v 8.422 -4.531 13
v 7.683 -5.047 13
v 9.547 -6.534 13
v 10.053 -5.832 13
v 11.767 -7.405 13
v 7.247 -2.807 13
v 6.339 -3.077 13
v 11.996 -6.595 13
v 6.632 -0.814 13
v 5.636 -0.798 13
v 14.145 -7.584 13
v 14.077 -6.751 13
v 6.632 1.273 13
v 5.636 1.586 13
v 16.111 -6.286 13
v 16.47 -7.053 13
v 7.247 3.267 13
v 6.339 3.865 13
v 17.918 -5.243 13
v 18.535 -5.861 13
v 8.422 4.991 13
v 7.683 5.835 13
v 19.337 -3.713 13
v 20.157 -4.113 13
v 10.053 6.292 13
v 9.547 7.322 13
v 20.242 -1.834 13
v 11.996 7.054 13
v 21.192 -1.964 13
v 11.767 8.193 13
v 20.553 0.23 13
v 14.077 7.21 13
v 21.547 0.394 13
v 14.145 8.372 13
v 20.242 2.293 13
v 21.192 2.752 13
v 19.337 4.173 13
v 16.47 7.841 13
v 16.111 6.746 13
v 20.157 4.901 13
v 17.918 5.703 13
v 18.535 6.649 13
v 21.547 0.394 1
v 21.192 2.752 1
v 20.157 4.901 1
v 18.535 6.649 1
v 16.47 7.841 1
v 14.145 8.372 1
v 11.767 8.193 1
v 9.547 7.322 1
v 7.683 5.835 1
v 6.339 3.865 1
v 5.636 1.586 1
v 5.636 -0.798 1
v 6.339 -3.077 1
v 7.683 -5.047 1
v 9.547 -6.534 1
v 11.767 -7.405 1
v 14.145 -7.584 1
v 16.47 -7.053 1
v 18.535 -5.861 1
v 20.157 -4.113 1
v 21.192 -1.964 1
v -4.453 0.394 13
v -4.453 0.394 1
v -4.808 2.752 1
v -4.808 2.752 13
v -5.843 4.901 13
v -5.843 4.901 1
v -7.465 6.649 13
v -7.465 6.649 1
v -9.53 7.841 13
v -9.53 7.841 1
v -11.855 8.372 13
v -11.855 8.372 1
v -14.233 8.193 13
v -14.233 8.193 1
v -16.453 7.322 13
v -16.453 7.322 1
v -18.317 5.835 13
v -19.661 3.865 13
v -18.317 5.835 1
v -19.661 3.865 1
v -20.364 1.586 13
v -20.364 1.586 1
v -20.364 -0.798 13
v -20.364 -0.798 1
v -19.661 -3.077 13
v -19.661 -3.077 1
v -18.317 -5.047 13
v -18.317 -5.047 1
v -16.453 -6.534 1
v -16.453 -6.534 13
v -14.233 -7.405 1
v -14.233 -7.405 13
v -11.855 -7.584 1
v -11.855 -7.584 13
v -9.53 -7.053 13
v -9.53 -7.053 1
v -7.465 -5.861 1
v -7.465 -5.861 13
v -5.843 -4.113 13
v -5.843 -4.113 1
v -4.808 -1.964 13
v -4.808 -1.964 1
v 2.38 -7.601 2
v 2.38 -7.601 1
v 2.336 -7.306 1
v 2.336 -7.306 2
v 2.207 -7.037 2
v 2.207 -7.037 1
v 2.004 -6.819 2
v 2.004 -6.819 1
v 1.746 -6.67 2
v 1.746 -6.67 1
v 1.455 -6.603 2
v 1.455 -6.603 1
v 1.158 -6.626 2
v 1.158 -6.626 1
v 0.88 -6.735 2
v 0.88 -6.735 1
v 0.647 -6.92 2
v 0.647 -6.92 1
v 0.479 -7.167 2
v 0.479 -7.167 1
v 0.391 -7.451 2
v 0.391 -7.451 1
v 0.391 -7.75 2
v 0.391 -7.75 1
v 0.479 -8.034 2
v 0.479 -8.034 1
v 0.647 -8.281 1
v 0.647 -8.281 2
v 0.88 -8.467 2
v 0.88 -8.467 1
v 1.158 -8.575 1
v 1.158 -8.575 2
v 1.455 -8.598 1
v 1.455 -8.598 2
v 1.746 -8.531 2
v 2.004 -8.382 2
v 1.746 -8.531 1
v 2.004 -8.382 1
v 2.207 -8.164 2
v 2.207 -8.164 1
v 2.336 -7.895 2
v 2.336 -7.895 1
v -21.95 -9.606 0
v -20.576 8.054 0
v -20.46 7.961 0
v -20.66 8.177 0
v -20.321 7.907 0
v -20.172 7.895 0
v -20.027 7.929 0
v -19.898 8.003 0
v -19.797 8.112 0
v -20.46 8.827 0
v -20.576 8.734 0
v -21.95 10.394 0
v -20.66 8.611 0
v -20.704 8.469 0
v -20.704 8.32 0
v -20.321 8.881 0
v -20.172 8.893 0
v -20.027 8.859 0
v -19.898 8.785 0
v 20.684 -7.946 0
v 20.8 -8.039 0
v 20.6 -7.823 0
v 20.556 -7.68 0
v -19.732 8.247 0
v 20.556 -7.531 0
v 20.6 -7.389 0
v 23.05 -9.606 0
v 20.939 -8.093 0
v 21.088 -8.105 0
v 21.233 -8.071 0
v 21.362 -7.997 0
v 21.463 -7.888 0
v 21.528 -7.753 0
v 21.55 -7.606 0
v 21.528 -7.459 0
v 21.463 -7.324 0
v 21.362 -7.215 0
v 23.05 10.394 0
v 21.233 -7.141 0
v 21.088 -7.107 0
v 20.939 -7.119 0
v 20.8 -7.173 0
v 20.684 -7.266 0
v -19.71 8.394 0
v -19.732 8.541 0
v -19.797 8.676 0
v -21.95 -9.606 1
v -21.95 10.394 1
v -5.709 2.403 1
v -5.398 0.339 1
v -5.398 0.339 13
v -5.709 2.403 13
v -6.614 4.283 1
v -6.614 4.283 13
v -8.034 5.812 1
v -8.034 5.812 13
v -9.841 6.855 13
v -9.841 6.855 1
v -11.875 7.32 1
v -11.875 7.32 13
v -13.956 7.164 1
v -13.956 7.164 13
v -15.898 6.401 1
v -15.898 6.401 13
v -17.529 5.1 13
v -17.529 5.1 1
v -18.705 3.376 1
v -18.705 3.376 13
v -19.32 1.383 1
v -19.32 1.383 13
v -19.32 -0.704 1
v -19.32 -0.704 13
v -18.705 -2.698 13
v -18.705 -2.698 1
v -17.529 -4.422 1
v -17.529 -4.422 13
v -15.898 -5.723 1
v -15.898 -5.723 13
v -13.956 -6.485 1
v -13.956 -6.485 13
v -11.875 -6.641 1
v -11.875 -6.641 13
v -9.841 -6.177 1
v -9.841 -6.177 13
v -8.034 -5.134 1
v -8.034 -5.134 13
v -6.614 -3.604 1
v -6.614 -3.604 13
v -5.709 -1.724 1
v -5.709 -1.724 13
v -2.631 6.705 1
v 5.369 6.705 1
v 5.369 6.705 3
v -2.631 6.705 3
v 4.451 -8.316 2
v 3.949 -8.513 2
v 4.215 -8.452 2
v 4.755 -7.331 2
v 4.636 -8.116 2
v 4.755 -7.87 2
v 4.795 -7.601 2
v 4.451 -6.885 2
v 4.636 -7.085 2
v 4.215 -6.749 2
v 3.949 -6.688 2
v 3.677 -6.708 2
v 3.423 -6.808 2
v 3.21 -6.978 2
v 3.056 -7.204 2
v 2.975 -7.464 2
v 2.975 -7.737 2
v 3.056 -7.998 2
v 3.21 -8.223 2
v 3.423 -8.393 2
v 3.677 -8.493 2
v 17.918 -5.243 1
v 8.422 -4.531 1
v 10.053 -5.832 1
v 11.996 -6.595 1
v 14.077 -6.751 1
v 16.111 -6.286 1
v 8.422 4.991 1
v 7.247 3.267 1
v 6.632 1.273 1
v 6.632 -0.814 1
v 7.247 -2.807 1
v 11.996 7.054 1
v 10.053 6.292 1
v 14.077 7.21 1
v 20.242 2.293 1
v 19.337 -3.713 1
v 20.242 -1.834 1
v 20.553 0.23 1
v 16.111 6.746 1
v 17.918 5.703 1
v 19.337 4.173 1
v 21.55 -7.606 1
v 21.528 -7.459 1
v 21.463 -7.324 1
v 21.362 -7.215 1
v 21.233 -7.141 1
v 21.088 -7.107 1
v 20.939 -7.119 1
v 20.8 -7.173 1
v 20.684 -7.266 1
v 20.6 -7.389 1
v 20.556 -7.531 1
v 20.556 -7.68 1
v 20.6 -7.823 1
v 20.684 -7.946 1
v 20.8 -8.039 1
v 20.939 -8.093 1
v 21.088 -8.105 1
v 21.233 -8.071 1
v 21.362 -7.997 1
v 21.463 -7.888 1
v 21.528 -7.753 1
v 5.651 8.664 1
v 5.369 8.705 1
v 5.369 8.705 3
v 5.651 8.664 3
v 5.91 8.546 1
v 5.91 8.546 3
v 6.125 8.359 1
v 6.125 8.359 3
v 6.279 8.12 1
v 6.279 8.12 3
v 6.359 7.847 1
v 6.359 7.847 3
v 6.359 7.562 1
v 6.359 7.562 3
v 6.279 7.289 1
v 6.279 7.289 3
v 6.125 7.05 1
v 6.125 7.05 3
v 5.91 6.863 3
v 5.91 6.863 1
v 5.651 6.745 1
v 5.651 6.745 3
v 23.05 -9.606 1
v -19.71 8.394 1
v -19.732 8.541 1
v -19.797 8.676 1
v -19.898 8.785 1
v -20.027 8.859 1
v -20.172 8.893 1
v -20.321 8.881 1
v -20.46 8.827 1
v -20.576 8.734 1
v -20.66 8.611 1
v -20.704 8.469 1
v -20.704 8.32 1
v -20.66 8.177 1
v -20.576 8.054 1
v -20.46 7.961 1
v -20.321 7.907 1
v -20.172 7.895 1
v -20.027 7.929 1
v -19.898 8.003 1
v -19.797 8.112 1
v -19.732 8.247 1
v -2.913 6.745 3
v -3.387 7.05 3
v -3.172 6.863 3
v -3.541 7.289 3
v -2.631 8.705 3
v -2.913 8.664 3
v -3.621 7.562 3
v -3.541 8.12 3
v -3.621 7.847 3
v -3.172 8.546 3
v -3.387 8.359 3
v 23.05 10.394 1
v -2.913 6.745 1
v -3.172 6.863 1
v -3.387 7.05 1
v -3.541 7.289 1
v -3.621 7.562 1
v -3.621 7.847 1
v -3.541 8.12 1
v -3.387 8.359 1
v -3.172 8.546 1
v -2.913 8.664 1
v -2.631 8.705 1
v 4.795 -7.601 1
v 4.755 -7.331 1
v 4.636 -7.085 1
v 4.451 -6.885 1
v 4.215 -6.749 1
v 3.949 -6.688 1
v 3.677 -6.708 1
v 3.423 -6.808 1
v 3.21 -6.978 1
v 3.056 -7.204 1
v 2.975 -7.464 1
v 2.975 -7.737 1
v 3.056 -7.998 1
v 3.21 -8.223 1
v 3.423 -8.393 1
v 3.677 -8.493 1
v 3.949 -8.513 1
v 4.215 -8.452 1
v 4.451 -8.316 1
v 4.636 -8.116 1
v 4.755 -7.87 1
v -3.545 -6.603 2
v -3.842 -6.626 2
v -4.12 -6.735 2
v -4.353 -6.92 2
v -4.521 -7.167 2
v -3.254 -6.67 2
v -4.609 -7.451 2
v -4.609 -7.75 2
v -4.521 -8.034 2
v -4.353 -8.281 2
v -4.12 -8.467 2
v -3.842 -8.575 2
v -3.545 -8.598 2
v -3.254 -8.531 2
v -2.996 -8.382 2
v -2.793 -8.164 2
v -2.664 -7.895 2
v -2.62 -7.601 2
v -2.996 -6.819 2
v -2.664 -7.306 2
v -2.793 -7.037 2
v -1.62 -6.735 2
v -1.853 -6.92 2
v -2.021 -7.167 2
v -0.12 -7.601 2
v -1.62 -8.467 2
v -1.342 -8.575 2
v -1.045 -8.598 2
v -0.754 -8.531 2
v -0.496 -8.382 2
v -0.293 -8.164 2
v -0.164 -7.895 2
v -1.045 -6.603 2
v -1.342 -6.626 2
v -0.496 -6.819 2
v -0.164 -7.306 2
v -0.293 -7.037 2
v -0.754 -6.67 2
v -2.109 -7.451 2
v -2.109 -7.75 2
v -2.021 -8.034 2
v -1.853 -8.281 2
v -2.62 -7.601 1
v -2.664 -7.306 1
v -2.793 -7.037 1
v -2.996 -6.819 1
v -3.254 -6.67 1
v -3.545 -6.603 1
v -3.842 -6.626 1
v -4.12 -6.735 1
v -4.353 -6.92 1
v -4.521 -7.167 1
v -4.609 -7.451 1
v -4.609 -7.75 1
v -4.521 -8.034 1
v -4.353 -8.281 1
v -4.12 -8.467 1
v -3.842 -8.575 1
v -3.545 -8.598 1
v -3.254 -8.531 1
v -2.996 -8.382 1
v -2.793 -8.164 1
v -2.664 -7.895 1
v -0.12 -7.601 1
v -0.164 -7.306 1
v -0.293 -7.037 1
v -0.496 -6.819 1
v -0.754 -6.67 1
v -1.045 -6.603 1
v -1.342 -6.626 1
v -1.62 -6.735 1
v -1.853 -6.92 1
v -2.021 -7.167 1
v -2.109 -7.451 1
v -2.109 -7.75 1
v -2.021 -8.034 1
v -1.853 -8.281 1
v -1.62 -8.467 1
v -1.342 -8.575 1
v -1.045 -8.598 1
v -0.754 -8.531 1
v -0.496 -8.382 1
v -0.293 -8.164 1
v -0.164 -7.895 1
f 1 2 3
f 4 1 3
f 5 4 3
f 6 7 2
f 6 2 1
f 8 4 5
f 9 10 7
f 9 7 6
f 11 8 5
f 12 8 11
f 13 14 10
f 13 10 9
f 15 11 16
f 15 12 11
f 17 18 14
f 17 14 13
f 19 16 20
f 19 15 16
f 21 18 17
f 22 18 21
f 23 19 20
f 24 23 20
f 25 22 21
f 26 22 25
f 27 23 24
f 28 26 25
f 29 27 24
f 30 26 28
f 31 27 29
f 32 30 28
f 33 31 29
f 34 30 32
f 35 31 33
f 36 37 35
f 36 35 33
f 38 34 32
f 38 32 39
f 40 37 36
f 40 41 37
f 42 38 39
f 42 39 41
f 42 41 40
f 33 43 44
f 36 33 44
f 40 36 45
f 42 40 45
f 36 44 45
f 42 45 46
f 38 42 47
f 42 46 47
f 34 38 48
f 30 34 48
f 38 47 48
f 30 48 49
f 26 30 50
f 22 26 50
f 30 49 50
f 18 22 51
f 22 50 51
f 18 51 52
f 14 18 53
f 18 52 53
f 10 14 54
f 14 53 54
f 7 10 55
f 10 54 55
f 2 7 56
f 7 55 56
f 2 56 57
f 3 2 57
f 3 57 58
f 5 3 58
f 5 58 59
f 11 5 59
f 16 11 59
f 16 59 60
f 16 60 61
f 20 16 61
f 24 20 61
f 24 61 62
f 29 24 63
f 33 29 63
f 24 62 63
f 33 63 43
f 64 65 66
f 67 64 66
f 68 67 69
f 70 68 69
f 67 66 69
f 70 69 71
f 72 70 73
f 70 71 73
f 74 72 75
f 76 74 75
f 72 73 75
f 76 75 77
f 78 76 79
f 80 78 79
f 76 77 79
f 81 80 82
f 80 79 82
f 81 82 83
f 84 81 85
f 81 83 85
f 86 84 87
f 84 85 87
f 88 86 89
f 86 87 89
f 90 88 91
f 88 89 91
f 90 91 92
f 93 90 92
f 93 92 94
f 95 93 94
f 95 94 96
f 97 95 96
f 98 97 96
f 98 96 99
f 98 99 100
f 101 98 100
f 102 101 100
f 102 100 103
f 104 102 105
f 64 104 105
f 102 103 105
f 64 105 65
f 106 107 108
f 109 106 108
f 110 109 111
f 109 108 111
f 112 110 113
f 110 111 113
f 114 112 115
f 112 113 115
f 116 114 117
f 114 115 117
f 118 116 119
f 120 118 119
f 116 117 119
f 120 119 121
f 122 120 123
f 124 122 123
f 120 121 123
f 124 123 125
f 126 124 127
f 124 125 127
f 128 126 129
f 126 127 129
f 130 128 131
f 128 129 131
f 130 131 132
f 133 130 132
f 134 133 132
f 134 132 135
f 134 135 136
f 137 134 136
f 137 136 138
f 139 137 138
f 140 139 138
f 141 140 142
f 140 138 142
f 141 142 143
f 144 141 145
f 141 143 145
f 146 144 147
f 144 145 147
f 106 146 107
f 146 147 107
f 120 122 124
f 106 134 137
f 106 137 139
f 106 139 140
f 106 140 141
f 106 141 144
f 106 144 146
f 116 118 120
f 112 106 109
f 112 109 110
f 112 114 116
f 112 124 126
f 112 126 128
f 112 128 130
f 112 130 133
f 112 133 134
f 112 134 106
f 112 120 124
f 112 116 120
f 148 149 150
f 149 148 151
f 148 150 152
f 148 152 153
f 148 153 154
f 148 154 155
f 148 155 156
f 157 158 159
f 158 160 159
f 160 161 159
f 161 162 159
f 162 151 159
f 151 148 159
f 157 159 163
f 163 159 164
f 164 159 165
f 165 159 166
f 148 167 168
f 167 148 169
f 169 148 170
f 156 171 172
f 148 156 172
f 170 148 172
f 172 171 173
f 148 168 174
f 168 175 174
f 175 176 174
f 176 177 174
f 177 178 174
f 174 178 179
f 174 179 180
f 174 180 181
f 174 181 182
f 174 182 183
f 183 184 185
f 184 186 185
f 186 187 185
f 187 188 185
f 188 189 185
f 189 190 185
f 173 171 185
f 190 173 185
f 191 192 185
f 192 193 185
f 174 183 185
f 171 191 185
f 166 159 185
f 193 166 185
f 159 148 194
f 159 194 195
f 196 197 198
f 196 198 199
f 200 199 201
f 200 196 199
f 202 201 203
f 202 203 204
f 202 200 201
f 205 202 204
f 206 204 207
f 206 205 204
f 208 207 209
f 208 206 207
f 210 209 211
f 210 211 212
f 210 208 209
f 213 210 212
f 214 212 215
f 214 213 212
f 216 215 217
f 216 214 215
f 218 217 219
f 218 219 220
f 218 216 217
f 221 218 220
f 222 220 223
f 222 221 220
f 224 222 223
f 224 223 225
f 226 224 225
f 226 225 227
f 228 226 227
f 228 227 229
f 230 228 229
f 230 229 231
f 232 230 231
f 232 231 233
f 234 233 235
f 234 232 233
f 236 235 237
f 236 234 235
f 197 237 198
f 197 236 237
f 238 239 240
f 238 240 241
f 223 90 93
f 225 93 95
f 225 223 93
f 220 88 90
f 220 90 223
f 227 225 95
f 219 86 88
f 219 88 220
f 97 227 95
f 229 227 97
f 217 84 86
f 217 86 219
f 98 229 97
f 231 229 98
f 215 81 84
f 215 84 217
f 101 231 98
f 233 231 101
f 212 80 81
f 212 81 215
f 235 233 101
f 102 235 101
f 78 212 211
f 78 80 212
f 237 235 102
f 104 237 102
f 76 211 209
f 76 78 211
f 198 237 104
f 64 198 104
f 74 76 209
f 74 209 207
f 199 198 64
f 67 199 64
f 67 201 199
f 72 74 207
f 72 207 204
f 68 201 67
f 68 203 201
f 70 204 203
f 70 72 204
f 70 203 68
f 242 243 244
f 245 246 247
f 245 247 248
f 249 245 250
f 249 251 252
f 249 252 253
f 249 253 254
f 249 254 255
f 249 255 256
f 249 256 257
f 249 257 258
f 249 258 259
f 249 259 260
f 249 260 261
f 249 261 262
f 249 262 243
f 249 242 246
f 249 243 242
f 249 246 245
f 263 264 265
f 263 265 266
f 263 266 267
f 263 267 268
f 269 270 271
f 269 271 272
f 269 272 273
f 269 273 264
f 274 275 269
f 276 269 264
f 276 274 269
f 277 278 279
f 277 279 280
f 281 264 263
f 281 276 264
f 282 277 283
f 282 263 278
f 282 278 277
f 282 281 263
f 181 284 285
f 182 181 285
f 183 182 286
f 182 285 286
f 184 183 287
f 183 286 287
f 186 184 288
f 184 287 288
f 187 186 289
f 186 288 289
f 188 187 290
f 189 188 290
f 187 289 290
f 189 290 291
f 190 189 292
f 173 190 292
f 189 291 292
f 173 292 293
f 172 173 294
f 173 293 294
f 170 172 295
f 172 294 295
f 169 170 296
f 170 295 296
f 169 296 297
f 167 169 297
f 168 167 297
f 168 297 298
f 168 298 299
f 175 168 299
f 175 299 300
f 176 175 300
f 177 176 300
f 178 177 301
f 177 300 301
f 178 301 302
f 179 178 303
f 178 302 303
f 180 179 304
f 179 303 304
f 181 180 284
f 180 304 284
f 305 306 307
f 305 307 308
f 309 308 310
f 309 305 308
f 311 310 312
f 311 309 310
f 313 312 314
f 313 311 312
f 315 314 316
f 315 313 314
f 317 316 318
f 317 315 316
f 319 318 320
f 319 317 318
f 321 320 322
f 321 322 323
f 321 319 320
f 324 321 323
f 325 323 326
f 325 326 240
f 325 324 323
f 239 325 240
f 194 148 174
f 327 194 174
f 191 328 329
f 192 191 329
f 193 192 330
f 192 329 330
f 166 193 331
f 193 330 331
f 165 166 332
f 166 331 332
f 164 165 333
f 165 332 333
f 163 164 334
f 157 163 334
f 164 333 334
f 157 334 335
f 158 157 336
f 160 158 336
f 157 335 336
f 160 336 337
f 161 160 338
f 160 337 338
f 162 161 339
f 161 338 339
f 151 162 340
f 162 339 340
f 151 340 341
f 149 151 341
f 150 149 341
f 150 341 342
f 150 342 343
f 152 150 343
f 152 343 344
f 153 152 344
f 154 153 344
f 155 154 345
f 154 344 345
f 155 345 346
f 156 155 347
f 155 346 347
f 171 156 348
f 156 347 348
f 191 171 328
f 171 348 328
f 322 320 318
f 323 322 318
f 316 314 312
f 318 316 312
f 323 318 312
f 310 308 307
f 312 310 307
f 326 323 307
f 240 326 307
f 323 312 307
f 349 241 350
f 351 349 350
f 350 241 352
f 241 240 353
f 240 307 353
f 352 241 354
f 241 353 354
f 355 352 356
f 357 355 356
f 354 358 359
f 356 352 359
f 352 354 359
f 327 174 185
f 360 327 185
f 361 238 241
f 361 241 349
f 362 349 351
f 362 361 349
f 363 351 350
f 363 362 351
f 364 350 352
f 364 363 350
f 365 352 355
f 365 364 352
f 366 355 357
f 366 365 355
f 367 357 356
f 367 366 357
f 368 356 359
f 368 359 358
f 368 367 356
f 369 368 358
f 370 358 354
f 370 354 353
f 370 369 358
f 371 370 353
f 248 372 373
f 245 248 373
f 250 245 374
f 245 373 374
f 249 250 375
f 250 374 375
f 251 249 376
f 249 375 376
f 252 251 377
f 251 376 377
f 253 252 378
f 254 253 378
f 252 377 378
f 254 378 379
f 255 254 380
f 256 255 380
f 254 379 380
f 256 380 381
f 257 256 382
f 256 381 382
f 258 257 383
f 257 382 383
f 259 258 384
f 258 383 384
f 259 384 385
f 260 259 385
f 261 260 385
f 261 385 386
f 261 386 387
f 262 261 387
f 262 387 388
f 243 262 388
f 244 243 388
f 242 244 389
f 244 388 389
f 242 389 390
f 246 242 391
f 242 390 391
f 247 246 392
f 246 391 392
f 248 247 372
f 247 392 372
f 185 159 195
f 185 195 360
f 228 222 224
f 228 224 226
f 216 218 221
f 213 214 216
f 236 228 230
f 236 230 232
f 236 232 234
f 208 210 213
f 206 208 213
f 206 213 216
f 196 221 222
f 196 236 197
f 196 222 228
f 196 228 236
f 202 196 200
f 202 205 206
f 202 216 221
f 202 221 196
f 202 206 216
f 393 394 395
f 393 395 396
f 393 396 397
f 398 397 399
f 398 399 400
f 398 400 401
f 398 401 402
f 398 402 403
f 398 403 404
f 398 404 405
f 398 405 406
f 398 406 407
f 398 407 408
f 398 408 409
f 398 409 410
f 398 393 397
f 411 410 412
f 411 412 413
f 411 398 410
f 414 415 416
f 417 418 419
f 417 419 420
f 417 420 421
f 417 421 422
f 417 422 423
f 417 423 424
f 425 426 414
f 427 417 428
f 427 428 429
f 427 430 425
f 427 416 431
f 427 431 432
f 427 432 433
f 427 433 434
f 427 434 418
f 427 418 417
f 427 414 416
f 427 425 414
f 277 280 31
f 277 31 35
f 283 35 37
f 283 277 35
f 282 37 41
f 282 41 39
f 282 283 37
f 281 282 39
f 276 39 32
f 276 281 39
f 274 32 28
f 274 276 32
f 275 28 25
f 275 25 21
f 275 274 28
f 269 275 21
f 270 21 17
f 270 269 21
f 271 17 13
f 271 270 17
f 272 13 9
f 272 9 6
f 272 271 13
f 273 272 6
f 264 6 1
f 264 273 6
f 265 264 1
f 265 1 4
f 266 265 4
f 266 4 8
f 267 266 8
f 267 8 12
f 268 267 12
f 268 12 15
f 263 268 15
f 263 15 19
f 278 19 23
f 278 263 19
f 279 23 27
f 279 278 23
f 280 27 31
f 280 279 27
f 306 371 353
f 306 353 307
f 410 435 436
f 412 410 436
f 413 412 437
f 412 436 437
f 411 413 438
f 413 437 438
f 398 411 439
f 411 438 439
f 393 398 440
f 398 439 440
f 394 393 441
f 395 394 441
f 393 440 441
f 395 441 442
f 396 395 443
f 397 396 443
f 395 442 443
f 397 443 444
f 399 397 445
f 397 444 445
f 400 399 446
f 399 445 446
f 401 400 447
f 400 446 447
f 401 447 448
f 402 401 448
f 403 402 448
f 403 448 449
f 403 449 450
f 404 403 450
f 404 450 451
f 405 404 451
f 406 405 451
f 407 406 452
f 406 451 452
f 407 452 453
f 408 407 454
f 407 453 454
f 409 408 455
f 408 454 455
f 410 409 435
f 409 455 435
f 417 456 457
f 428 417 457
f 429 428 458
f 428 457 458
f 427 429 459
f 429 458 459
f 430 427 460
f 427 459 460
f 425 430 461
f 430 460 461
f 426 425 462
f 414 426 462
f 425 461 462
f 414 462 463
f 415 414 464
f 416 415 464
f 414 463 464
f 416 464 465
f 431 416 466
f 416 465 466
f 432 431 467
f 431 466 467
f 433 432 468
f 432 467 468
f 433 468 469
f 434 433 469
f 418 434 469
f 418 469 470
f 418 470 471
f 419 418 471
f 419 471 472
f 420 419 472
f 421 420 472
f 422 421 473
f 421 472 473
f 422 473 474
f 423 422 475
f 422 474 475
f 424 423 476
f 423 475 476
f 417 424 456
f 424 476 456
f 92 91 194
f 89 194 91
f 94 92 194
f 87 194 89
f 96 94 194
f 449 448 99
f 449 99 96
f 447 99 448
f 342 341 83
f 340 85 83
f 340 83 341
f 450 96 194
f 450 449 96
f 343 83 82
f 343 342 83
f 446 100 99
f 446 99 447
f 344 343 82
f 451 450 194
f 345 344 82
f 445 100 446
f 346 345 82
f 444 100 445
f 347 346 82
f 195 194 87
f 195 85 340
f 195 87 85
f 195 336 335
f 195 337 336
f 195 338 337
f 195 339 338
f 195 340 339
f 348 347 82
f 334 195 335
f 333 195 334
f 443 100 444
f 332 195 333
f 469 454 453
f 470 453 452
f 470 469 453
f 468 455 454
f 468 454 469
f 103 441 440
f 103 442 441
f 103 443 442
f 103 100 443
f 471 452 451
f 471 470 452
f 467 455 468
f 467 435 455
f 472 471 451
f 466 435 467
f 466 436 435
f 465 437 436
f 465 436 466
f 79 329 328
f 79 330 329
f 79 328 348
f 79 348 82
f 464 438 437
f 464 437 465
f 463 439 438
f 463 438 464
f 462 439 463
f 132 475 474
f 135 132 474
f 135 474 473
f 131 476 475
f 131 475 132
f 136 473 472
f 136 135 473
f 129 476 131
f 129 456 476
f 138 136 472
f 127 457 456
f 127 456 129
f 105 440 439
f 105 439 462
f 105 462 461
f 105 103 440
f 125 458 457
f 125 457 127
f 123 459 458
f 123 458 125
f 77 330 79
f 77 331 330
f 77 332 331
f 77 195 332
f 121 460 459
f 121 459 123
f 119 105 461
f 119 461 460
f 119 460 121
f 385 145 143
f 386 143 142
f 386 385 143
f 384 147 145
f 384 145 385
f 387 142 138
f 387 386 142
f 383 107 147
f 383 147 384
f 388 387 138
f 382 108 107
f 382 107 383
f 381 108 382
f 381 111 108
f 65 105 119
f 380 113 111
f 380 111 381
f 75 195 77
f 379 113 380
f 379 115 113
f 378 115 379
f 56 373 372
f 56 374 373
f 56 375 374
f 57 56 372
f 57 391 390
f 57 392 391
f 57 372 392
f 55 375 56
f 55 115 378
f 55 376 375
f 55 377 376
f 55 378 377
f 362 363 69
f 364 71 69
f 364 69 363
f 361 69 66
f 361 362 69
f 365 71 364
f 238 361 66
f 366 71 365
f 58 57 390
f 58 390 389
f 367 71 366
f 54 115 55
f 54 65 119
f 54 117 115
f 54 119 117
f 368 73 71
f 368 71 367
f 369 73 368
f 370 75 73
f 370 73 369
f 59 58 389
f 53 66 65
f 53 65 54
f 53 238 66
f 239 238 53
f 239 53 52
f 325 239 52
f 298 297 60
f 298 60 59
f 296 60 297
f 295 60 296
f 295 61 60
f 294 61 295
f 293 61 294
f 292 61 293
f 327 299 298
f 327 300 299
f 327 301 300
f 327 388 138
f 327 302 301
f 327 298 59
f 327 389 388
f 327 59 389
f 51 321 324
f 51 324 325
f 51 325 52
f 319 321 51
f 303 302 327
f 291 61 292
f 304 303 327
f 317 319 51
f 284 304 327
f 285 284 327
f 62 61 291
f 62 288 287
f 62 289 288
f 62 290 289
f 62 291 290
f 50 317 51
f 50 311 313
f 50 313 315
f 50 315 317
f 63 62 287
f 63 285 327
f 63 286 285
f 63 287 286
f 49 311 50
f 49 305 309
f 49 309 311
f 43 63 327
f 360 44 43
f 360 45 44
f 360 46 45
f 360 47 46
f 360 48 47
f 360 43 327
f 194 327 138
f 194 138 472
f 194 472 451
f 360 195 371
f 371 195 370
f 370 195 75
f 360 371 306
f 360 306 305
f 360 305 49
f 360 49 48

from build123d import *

# Parameters (mm, degrees)
SKETCH1_W           = 45
SKETCH1_H           = 20
BOSS_EXTRUDE1_DEPTH = 1
SKETCH2_R           = 8
SKETCH2_R_2         = 7
BOSS_EXTRUDE2_DEPTH = 12
BOSS_EXTRUDE3_DEPTH = 2
SKETCH5_R           = 1
SKETCH5_R_2         = 0.915040835
BOSS_EXTRUDE4_DEPTH = 1
SKETCH6_R           = 0.5
CUT_EXTRUDE1_DEPTH  = 1


with BuildPart() as part:
    # Sketch1 → Boss-Extrude1 (new body)
    with BuildSketch(Plane.XY):
        with Locations((0.550271739, 0.394021739)):
            Rectangle(SKETCH1_W, SKETCH1_H)
    extrude(amount=BOSS_EXTRUDE1_DEPTH)

    # Sketch2 → Boss-Extrude2 (add)
    # profile 1 of 2: a face of its own
    with BuildSketch(Plane.XY.offset(1)):
        with Locations((-12.452884101, 0.394021739)):
            Circle(SKETCH2_R)
        with Locations((-12.398133971, 0.339271609)):
            Circle(SKETCH2_R_2, mode=Mode.SUBTRACT)
    # profile 2 of 2: a face of its own
    with BuildSketch(Plane.XY.offset(1)):
        with Locations((13.547115899, 0.394021739)):
            Circle(SKETCH2_R)
        with Locations((13.55342758, 0.22977135)):
            Circle(SKETCH2_R_2, mode=Mode.SUBTRACT)
    extrude(amount=BOSS_EXTRUDE2_DEPTH)

    # Sketch4 → Boss-Extrude3 (add)
    with BuildSketch(Plane.XY.offset(1)):
        with BuildLine():
            Line((-2.6309647, 8.704551111), (5.3690353, 8.704551111))
            ThreePointArc((5.3690353, 8.704551111), (6.3690353, 7.704551111), (5.3690353, 6.704551111))
            Line((5.3690353, 6.704551111), (-2.6309647, 6.704551111))
            ThreePointArc((-2.6309647, 6.704551111), (-3.6309647, 7.704551111), (-2.6309647, 8.704551111))
        make_face()
    extrude(amount=BOSS_EXTRUDE3_DEPTH)

    # Sketch5 → Boss-Extrude4 (add)
    with BuildSketch(Plane.XY.offset(1)):
        with Locations((-3.619683348, -7.600525734)):
            Circle(SKETCH5_R)
        with Locations((-1.119683348, -7.600525734)):
            Circle(SKETCH5_R)
        with Locations((1.380316652, -7.600525734)):
            Circle(SKETCH5_R)
        with Locations((3.880316652, -7.600525734)):
            Circle(SKETCH5_R_2)
    extrude(amount=BOSS_EXTRUDE4_DEPTH)

    # Sketch6 → Cut-Extrude1 (cut)
    with BuildSketch(Plane.XY.offset(1)):
        with Locations((-20.209689263, 8.394021739)):
            Circle(SKETCH6_R)
        with Locations((21.050271739, -7.605978261)):
            Circle(SKETCH6_R)
    extrude(amount=-CUT_EXTRUDE1_DEPTH, mode=Mode.SUBTRACT)


solid = part.part
